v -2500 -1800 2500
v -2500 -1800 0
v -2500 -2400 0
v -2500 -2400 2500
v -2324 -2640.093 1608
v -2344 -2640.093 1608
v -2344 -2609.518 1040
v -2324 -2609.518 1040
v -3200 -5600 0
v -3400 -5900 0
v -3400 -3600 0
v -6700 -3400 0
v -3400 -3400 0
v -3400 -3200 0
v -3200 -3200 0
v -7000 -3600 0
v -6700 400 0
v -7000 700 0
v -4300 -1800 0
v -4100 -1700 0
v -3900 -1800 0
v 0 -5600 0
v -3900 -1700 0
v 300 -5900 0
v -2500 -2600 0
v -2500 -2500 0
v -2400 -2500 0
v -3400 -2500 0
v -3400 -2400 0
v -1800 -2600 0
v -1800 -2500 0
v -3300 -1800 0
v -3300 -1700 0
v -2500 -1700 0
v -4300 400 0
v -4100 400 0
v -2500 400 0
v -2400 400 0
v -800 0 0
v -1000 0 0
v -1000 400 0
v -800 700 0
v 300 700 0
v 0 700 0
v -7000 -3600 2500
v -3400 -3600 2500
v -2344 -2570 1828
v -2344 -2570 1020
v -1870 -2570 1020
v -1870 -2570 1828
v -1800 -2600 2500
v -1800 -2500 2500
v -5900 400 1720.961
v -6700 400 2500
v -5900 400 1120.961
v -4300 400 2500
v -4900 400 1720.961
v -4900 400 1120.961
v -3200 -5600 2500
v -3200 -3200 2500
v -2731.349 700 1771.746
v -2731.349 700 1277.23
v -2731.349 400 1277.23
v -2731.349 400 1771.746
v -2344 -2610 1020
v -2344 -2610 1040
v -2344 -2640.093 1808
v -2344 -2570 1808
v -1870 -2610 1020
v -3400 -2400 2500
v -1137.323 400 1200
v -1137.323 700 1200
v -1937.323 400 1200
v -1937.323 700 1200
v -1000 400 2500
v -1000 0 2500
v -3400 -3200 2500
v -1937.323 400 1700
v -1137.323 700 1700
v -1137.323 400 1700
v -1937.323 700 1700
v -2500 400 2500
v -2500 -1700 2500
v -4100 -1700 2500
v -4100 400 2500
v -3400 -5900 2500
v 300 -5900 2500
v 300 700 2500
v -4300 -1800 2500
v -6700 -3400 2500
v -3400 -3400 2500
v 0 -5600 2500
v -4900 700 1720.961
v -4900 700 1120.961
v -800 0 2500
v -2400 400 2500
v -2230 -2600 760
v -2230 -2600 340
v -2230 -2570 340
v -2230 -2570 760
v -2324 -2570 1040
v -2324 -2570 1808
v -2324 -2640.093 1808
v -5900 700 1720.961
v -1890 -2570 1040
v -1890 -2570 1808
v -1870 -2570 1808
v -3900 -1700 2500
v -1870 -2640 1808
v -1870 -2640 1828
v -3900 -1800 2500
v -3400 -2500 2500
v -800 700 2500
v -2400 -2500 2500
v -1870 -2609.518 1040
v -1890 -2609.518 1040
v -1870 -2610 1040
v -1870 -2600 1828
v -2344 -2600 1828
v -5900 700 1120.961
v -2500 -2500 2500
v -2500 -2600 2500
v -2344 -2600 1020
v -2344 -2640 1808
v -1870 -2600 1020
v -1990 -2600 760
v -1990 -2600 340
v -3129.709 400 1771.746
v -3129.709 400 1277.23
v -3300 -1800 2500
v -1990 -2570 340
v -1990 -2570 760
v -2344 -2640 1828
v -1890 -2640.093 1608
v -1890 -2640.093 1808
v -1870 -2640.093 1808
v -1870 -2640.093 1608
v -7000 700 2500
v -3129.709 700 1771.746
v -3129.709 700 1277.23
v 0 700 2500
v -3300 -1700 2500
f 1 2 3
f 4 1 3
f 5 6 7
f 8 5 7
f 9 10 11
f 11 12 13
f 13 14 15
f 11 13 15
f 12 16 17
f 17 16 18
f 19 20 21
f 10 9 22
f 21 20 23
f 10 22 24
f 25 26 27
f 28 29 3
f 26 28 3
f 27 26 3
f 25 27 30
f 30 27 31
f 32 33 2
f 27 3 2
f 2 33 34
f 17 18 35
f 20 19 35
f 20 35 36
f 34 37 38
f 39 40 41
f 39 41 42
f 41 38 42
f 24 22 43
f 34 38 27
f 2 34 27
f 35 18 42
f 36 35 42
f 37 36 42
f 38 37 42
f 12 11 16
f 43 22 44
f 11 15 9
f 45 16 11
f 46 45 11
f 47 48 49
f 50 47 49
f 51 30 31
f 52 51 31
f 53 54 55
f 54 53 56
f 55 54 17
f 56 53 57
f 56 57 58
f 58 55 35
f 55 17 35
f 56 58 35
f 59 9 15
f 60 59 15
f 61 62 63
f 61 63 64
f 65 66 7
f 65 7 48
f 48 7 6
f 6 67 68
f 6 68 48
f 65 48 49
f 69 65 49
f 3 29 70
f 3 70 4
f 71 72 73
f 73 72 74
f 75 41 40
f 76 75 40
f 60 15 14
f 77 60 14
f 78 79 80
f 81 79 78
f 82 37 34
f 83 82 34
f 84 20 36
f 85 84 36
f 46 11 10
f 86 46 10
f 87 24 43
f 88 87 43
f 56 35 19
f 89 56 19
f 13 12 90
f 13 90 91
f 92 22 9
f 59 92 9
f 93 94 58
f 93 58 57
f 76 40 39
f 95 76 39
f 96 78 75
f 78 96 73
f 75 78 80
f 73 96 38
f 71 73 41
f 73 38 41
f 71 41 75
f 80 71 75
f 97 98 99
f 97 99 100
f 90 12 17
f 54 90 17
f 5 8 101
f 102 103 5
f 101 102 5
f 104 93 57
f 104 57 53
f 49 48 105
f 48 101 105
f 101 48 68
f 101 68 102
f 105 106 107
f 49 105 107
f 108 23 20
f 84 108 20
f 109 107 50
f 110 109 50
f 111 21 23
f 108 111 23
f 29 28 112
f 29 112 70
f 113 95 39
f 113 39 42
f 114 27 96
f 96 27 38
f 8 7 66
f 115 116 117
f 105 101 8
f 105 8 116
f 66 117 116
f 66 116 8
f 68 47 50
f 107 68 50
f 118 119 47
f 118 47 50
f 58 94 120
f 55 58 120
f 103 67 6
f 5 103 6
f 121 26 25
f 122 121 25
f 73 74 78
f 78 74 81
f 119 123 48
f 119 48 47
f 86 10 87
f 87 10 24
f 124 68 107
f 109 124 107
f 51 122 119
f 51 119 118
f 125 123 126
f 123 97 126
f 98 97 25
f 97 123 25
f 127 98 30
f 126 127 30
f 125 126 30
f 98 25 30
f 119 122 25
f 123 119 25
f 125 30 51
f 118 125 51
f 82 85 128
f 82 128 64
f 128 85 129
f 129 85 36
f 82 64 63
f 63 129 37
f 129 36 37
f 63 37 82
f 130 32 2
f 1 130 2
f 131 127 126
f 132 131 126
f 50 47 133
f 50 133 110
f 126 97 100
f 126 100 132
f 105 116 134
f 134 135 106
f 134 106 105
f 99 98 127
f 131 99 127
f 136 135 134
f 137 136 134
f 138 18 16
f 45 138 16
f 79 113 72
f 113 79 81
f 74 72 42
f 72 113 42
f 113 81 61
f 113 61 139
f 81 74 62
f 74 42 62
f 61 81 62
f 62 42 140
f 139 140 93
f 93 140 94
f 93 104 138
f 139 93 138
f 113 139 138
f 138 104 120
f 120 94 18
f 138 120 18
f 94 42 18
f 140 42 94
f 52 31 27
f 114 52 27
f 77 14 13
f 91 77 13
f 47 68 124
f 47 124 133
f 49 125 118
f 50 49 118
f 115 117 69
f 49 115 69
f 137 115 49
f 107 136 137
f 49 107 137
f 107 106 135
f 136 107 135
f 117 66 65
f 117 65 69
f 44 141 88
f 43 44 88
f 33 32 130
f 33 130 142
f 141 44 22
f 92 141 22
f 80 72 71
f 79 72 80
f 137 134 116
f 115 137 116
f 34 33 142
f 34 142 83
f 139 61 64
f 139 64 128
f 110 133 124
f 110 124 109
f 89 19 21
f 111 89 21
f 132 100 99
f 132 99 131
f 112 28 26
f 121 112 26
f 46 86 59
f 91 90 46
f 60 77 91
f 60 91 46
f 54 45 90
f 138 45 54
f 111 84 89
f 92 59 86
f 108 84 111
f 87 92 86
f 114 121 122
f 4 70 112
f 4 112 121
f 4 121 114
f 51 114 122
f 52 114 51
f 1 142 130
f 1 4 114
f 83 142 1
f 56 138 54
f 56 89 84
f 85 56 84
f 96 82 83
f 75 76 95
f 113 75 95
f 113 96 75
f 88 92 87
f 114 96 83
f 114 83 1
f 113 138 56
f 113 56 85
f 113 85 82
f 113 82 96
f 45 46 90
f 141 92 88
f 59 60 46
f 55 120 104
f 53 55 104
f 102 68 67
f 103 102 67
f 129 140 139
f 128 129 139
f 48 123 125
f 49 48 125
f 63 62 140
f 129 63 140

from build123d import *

# Parameters (mm, degrees)
F0_W      = 3300
F0_H      = 200
F0_W_2    = 300
F0_H_2    = 5600
F0_H_3    = 700
F0_W_3    = 900
F0_H_4    = 100
F0_W_4    = 800
F0_W_5    = 200
F0_H_5    = 2100
F1_DEPTH  = 2500
F2_W      = 1000
F2_H      = 600
F2_W_2    = 800
F2_H_2    = 500
F2_W_3    = 398.3602523804
F2_H_3    = 494.5161342621
F3_DEPTH  = 990
F4_W      = 240
F4_H      = 420
F4_W_2    = 474
F4_H_2    = 808
F5_DEPTH  = 30
F6_W      = 474
F6_H      = 20
F7_DEPTH  = 40
F8_W      = 474
F8_H      = 20
F9_DEPTH  = 70
F11_DEPTH = 20
F12_START = 454
F12_DEPTH = 20


with BuildPart() as f1:
    # F0 (on Top) → F1 (new body)
    with BuildSketch(Plane.XY):
        Polygon((-7000, 400), (-6700, 400), (-4300, 400), (-4100, 400), (-2500, 400), (-2400, 400), (-1000, 400), (-1000, 700), (-7000, 700), align=None)
        Polygon((-7000, -3600), (-6700, -3600), (-6700, -3400), (-6700, 400), (-7000, 400), align=None)
        with Locations((-5050, -3500)):
            Rectangle(F0_W, F0_H)
        Polygon((-3200, -5900), (-3200, -5600), (-3200, -3200), (-3400, -3200), (-3400, -3400), (-3400, -3600), (-3400, -5900), align=None)
        Polygon((300, -5600), (0, -5600), (-3200, -5600), (-3200, -5900), (300, -5900), align=None)
        with Locations((150, -2800)):
            Rectangle(F0_W_2, F0_H_2)
        with Locations((150, 350)):
            Rectangle(F0_W_2, F0_H_3)
        Polygon((-800, 700), (-1000, 700), (-1000, 400), (-1000, 0), (-800, 0), align=None)
        Polygon((-1800, -2500), (-2400, -2500), (-2500, -2500), (-2500, -2600), (-1800, -2600), align=None)
        Polygon((-2400, 400), (-2500, 400), (-2500, -1700), (-2500, -1800), (-2500, -2400), (-2500, -2500), (-2400, -2500), align=None)
        with Locations((-2950, -2450)):
            Rectangle(F0_W_3, F0_H_4)
        with Locations((-2900, -1750)):
            Rectangle(F0_W_4, F0_H_4)
        with Locations((-4000, -1750)):
            Rectangle(F0_W_5, F0_H_4)
        with Locations((-4200, -1750)):
            Rectangle(F0_W_5, F0_H_4)
        with Locations((-4200, -650)):
            Rectangle(F0_W_5, F0_H_5)
    extrude(amount=F1_DEPTH)

    # F2 (on face) → F3 (cut)
    with BuildSketch(Plane(origin=(0, 700, 0), x_dir=(-1, 0, 0), z_dir=(0, 1, 0))):
        with Locations((5400, 1420.9607362747)):
            Rectangle(F2_W, F2_H)
        with Locations((1537.3227357864, 1450)):
            Rectangle(F2_W_2, F2_H_2)
        with Locations((2930.5288791656, 1524.4877338409)):
            Rectangle(F2_W_3, F2_H_3)
    extrude(amount=-F3_DEPTH, mode=Mode.SUBTRACT)

    # F4 (on face) → F5 (cut)
    with BuildSketch(Plane.XZ.offset(2600)):
        with Locations((-2110, 550)):
            Rectangle(F4_W, F4_H)
        with Locations((-2107, 1424)):
            Rectangle(F4_W_2, F4_H_2)
    extrude(amount=-F5_DEPTH, mode=Mode.SUBTRACT)


with BuildPart() as f7:
    # F6 (on face) → F7 (new body)
    with BuildSketch(Plane.XZ.offset(2570)):
        with Locations((-2107, 1030)):
            Rectangle(F6_W, F6_H)
    extrude(amount=F7_DEPTH)

    # F10 (on face) → F11 (join)
    with BuildSketch(Plane.YZ.offset(-2344)):
        Polygon((-2640.0933265686, 1608), (-2609.5175743103, 1040), (-2570, 1040), (-2570, 1808), (-2640.0933265686, 1808), align=None)
    extrude(amount=F11_DEPTH)

    # F10 (on face) → F12 (join)
    with BuildSketch(Plane.YZ.offset(-2344).offset(F12_START)):
        Polygon((-2640.0933265686, 1608), (-2609.5175743103, 1040), (-2570, 1040), (-2570, 1808), (-2640.0933265686, 1808), align=None)
    extrude(amount=F12_DEPTH)


with BuildPart() as f9:
    # F8 (on face) → F9 (new body)
    with BuildSketch(Plane.XZ.offset(2570)):
        with Locations((-2107, 1818)):
            Rectangle(F8_W, F8_H)
    extrude(amount=F9_DEPTH)


solid = Compound([f1.part, f7.part, f9.part])
